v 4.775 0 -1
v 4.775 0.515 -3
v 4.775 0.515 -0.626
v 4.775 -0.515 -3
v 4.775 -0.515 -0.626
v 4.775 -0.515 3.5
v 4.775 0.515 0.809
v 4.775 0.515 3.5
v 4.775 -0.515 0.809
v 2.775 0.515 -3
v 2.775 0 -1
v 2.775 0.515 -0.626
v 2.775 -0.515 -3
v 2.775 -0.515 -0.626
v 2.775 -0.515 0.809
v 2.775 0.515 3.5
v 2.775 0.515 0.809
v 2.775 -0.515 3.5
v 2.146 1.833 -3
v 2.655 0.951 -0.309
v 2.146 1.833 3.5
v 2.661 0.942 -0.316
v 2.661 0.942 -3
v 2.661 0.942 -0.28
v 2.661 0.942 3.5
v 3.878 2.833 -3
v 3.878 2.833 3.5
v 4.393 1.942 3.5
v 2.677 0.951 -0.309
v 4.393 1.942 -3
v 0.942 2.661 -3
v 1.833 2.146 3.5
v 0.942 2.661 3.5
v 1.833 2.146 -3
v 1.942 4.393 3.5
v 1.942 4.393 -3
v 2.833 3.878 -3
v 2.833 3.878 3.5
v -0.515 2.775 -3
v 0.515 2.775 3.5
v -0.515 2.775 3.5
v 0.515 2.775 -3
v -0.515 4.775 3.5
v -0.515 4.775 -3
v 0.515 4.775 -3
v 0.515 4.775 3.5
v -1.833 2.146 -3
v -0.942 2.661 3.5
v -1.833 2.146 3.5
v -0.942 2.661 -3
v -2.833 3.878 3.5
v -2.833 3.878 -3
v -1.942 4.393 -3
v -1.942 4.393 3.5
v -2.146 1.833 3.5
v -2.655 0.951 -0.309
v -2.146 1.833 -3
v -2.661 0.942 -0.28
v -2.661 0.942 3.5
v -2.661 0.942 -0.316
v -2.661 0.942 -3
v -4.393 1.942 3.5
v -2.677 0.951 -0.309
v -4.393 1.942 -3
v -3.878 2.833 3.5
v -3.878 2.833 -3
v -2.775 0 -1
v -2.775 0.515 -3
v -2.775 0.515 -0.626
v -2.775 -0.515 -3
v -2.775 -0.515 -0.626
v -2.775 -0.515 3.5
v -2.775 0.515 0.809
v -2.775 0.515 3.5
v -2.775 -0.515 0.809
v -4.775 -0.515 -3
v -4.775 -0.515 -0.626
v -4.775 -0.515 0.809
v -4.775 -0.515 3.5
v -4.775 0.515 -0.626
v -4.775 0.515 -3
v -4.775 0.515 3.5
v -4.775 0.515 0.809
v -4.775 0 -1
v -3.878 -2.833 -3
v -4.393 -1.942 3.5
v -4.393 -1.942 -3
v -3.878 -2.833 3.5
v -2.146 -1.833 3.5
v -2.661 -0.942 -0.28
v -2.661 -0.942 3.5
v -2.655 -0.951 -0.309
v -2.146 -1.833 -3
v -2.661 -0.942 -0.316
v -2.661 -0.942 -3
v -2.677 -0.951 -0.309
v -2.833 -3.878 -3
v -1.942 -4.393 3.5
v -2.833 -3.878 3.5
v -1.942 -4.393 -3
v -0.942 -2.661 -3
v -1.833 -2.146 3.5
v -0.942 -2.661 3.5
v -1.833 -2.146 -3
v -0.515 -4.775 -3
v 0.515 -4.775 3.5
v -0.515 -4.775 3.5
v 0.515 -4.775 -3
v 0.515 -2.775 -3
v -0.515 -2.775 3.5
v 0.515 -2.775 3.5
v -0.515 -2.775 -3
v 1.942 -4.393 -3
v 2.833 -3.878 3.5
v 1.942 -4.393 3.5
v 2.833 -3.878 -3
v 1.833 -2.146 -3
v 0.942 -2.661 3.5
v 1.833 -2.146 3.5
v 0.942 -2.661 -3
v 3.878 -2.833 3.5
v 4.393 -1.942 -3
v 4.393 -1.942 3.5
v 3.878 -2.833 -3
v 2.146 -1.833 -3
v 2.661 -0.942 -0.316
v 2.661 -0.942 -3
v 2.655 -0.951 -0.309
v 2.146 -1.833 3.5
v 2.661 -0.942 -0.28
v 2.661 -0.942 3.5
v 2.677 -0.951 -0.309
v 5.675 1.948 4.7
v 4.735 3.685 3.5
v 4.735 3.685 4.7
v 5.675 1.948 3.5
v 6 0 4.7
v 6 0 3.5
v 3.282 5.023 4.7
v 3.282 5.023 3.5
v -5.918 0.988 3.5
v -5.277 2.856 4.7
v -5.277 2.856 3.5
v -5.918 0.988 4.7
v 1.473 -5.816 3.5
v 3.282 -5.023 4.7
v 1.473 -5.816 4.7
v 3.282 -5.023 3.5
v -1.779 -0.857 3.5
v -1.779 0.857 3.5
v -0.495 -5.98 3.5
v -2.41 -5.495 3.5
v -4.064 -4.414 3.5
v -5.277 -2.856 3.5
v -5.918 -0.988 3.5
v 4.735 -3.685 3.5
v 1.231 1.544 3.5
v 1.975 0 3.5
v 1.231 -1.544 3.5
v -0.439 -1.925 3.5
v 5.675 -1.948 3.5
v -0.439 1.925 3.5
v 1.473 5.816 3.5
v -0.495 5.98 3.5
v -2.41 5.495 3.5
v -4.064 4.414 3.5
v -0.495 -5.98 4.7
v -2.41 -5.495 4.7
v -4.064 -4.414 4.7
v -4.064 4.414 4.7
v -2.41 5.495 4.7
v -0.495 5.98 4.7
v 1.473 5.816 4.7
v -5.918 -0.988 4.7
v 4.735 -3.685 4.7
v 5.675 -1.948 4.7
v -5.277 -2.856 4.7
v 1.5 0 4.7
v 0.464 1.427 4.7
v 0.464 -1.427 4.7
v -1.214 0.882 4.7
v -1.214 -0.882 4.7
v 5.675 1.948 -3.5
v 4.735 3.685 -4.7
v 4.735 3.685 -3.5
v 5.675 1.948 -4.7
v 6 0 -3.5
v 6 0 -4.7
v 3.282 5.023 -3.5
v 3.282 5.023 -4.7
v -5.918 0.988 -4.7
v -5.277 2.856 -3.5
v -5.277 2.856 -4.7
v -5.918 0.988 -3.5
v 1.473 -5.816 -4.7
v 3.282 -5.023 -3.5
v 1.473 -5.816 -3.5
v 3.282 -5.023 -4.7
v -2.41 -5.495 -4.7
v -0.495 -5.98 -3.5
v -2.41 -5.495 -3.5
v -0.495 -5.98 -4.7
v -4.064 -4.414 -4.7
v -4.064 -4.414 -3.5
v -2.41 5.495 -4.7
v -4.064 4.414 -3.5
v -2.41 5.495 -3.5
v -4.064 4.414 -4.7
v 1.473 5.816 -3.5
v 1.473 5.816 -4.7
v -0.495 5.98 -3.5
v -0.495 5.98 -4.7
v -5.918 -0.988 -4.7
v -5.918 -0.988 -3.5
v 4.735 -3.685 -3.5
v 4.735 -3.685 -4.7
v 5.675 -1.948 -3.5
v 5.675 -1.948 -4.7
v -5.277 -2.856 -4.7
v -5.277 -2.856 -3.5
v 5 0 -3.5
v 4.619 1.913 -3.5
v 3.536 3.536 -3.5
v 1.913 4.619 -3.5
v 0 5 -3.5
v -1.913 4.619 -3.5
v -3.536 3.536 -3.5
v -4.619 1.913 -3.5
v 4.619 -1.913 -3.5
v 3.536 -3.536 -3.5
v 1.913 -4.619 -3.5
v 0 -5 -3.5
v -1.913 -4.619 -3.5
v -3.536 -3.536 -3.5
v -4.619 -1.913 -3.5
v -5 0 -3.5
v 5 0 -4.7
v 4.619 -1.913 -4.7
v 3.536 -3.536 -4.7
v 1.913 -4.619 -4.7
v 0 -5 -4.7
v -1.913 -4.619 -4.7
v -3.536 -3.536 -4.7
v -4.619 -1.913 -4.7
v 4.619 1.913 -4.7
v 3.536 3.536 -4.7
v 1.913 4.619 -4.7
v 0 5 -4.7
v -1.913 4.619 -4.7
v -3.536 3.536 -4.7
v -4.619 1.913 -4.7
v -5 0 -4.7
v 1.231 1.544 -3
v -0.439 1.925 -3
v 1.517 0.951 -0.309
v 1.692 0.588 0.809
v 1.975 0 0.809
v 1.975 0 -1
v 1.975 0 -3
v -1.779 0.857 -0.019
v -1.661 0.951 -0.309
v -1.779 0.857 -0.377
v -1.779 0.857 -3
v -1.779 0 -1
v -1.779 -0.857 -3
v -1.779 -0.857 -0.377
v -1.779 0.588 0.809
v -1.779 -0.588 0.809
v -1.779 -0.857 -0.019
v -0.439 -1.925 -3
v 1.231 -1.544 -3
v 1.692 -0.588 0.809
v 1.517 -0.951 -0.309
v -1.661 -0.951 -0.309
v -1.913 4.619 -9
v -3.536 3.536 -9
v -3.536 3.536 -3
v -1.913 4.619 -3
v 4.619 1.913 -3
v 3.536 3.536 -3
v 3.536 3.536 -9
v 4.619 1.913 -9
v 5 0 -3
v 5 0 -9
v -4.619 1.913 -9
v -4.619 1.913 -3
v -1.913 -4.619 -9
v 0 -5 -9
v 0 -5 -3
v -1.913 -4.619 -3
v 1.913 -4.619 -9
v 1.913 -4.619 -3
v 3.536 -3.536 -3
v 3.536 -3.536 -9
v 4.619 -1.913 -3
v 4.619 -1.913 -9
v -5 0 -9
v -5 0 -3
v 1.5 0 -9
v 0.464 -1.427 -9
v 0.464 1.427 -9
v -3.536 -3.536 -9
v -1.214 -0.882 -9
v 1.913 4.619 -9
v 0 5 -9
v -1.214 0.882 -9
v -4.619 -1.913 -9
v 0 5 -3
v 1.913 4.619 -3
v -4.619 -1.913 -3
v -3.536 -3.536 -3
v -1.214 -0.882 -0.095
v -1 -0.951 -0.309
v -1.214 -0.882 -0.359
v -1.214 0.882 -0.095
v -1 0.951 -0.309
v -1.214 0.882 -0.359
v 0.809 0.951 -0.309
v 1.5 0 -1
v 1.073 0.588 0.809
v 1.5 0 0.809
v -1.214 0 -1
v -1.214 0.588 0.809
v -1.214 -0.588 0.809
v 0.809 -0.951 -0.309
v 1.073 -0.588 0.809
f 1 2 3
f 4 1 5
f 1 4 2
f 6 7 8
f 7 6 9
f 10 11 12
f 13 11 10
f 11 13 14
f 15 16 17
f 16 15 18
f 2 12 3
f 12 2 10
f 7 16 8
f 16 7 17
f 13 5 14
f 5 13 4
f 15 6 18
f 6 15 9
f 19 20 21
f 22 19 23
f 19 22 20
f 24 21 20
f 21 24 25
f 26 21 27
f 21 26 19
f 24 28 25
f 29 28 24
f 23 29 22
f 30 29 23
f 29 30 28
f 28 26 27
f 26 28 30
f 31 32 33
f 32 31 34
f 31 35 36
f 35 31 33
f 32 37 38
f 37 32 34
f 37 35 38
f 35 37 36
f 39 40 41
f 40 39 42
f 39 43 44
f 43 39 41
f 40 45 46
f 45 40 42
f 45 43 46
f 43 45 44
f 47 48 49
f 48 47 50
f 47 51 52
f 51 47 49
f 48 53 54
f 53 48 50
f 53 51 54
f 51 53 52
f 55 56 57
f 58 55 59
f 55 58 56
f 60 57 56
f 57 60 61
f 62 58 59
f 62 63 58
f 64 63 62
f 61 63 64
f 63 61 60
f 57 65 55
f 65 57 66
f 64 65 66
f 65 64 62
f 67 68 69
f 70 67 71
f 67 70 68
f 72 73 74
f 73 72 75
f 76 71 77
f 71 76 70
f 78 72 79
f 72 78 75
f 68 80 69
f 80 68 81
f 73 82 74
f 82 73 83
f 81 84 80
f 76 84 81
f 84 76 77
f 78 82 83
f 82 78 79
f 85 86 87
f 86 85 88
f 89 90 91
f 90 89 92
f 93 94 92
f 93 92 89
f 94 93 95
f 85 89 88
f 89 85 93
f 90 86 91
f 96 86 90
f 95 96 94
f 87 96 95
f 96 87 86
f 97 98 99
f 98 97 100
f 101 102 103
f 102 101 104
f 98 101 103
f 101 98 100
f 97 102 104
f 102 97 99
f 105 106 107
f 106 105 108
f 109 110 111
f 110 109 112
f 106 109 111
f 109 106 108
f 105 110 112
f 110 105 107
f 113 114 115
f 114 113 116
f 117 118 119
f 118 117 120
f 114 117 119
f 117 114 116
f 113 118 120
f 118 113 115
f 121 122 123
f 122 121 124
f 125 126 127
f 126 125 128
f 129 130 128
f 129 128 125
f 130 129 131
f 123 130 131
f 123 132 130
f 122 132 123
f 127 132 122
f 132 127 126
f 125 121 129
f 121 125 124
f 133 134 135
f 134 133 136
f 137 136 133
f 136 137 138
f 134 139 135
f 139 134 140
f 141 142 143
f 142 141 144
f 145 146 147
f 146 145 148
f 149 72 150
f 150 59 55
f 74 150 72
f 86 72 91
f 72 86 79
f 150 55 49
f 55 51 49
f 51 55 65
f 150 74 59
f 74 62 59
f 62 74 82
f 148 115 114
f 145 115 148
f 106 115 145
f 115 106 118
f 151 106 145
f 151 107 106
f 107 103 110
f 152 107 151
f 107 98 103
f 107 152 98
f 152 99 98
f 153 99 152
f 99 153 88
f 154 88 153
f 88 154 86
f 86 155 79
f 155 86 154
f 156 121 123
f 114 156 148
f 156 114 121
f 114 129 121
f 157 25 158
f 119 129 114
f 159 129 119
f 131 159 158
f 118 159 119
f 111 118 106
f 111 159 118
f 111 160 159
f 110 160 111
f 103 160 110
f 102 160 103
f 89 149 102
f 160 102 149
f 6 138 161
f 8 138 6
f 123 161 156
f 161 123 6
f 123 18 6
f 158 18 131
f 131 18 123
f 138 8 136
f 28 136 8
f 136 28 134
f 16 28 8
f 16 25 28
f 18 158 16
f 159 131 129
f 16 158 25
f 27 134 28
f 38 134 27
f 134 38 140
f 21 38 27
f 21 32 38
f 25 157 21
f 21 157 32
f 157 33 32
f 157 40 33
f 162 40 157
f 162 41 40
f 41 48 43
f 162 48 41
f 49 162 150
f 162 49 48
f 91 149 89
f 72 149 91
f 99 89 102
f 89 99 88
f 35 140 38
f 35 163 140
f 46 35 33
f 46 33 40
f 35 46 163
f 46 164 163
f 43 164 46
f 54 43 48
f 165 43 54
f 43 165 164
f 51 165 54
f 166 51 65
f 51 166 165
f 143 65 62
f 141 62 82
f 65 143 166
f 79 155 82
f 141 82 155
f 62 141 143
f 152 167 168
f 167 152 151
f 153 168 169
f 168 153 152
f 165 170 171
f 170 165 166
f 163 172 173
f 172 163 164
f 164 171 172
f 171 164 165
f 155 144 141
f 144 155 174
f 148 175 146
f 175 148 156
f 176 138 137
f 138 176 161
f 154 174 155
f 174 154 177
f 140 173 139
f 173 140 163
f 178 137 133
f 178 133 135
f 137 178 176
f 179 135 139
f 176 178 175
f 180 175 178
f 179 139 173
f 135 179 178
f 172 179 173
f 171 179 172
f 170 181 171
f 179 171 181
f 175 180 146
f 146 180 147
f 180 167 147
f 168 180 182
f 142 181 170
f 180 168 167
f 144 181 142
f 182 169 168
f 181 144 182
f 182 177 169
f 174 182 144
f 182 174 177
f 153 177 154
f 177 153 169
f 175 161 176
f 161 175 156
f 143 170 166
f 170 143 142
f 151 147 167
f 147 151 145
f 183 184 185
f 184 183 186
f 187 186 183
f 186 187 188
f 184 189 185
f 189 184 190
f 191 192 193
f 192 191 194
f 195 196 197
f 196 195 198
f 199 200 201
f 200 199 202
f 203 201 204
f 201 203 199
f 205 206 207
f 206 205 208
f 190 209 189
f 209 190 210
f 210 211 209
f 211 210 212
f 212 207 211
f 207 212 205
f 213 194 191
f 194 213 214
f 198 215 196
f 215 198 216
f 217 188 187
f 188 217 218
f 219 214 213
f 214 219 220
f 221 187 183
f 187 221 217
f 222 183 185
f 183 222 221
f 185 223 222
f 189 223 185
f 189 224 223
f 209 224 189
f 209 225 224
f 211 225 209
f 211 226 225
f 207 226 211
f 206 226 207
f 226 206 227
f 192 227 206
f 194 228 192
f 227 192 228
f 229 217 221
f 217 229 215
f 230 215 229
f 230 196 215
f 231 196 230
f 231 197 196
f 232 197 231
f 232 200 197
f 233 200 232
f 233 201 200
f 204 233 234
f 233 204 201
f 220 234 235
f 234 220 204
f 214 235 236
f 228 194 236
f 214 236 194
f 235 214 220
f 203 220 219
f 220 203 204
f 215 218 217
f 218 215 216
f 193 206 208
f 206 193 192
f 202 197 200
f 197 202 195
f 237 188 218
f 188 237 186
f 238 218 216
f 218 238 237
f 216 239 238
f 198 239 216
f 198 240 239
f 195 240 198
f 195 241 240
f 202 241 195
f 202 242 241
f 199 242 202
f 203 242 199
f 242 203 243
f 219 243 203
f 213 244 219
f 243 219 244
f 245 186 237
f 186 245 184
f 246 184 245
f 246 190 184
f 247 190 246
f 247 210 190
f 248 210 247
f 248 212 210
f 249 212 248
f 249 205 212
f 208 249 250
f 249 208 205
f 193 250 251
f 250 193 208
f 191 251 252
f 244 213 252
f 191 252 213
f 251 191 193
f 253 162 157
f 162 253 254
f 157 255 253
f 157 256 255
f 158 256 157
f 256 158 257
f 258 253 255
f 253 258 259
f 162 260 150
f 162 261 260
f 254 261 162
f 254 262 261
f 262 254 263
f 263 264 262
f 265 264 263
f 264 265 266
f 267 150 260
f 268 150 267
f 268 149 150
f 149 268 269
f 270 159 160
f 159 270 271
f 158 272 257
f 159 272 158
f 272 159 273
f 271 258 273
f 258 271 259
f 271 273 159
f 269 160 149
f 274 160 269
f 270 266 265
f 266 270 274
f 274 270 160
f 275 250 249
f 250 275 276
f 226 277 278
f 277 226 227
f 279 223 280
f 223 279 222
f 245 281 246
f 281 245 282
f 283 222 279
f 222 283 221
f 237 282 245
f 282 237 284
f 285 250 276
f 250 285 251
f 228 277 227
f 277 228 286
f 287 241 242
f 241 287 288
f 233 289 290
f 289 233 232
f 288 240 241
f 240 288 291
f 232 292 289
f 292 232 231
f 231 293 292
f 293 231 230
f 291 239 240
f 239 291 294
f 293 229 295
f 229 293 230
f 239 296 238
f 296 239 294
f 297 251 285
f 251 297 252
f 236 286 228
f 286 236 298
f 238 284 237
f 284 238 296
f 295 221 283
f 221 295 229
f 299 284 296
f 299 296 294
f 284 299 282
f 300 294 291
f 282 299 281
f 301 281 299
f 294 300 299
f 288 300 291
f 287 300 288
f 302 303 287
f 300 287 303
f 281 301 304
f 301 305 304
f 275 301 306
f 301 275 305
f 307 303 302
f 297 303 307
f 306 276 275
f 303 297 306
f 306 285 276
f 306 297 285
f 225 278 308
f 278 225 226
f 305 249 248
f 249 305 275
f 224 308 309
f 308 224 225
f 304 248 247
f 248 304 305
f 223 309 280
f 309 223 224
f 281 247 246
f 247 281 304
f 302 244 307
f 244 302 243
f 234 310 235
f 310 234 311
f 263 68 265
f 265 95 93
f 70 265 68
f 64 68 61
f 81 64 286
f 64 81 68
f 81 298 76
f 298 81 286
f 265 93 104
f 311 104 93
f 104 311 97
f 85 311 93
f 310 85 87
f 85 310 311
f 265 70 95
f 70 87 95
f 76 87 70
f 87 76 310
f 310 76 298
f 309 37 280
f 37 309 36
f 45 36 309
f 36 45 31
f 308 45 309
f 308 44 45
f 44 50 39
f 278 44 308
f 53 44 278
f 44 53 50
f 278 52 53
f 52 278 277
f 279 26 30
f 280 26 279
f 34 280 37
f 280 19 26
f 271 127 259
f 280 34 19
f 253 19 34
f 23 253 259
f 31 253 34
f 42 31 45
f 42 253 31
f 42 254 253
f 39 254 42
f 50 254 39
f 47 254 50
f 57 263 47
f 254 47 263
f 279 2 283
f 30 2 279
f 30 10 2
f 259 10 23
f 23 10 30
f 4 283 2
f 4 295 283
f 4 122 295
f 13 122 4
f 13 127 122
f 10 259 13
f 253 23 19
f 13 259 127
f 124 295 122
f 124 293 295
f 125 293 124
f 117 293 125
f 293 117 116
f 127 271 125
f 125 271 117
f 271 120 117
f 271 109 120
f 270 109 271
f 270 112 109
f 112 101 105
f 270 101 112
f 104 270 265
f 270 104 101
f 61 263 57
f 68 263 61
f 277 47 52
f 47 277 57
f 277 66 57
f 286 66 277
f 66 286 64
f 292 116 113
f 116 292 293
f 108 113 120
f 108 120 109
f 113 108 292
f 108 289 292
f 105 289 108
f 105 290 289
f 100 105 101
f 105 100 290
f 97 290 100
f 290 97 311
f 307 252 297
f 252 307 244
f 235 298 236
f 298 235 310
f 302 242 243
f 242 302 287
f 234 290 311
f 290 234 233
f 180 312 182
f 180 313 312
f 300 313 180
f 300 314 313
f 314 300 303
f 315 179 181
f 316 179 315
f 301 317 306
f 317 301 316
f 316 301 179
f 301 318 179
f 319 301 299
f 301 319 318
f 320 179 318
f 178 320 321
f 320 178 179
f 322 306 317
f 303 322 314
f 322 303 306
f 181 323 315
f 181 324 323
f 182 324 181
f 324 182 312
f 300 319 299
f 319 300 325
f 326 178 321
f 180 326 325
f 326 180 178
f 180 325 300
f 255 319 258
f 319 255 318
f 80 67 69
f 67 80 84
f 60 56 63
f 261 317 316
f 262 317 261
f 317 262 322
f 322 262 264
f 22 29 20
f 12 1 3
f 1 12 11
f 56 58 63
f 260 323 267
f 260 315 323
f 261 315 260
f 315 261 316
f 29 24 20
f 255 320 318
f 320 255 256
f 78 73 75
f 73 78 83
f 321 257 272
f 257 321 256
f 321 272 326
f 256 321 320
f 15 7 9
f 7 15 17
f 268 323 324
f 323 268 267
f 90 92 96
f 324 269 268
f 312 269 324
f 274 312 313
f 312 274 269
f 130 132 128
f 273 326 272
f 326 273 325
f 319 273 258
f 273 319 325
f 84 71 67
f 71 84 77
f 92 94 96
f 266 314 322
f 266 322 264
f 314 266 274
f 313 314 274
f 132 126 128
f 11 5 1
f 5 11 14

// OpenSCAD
// Parameters
tooth_count = 12; //[6:24:1]
pitch_diameter_mm = 7.15; //[3.5:14.3:0.01]
pulley_width_mm = 8; //[4:20:0.5]
tooth_radial_height_mm = 1.2; //[0.6:2.4:0.05]
tooth_tangential_width_factor = 0.55; //[0.35:0.75:0.01]
tooth_overlap_mm = 0.8; //[0.3:2:0.05]
body_radial_thickness_mm = 1.6; //[0.8:3.2:0.05]
bore_diameter_mm = 3; //[1:6:0.1]
hub_diameter_mm = 10; //[5:20:0.1]
hub_length_mm = 6; //[0:20:0.5]
flange_diameter_mm = 12; //[7:24:0.1]
flange_thickness_mm = 1.2; //[0:3:0.1]
set_screw_count = 1; //[0:2:1]
set_screw_diameter_mm = 2; //[1:4:0.1]
set_screw_z_mm = 0; //[-10:10:0.5]
set_screw_radial_pos_factor = 0.75; //[0.55:0.95:0.01]
set_screw_length_mm = 30; //[10:80:1]

// Pulley Body
module pulley_body() {
  color("Silver") {
    cylinder(h=pulley_width_mm, r=(pitch_diameter_mm/2) - body_radial_thickness_mm, center=true);
  }
}

// Printed Pulley Teeth
module printed_pulley_teeth() {
  color("DimGray") {
    for (i = [0:tooth_count-1]) {
      rotate([0, 0, i*360/tooth_count]) {
        translate([(pitch_diameter_mm/2) + (tooth_radial_height_mm + tooth_overlap_mm)/2 - tooth_overlap_mm, 0, 0]) {
          cube([tooth_radial_height_mm + tooth_overlap_mm, (PI*pitch_diameter_mm/tooth_count) * tooth_tangential_width_factor, pulley_width_mm], center=true);
        }
      }
    }
  }
}

// Printed Pulley Teeth From Profile
module printed_pulley_teeth_from_profile() {
  printed_pulley_teeth();
}

// Printed Pulley GT2 Teeth
module printed_pulley_GT2_teeth() {
  printed_pulley_teeth_from_profile();
}

// Hub
module hub() {
  if (hub_length_mm > 0) {
    color("Silver") {
      translate([0, 0, -(pulley_width_mm/2) - (hub_length_mm/2) + 1]) {
        cylinder(h=hub_length_mm, r=hub_diameter_mm/2, center=true);
      }
    }
  }
}

// Flanges
module flanges() {
  if (flange_thickness_mm > 0) {
    color("Silver") {
      translate([0, 0, (pulley_width_mm/2) + (flange_thickness_mm/2) - 0.5]) {
        cylinder(h=flange_thickness_mm, r=flange_diameter_mm/2, center=true);
      }
      translate([0, 0, -(pulley_width_mm/2) - (flange_thickness_mm/2) + 0.5]) {
        cylinder(h=flange_thickness_mm, r=flange_diameter_mm/2, center=true);
      }
    }
  }
}

// Set Screw Holes
module set_screw_holes() {
  if (set_screw_count > 0) {
    color("Black") {
      translate([(hub_diameter_mm/2) * set_screw_radial_pos_factor, 0, set_screw_z_mm]) {
        rotate([0, 90, 0]) {
          cylinder(h=set_screw_length_mm, r=set_screw_diameter_mm/2, center=true);
        }
      }
      if (set_screw_count > 1) {
        rotate([0, 0, 90]) {
          translate([(hub_diameter_mm/2) * set_screw_radial_pos_factor, 0, set_screw_z_mm]) {
            rotate([0, 90, 0]) {
              cylinder(h=set_screw_length_mm, r=set_screw_diameter_mm/2, center=true);
            }
          }
        }
      }
    }
  }
}

// Pulley Assembly
module pulley() {
  difference() {
    union() {
      pulley_body();
      printed_pulley_GT2_teeth();
      hub();
      flanges();
    }
    cylinder(h=pulley_width_mm + 2*flange_thickness_mm + hub_length_mm + 2, r=bore_diameter_mm/2, center=true);
    set_screw_holes();
  }
}

// Final Assembly
module assembly() {
  pulley();
}

assembly();
